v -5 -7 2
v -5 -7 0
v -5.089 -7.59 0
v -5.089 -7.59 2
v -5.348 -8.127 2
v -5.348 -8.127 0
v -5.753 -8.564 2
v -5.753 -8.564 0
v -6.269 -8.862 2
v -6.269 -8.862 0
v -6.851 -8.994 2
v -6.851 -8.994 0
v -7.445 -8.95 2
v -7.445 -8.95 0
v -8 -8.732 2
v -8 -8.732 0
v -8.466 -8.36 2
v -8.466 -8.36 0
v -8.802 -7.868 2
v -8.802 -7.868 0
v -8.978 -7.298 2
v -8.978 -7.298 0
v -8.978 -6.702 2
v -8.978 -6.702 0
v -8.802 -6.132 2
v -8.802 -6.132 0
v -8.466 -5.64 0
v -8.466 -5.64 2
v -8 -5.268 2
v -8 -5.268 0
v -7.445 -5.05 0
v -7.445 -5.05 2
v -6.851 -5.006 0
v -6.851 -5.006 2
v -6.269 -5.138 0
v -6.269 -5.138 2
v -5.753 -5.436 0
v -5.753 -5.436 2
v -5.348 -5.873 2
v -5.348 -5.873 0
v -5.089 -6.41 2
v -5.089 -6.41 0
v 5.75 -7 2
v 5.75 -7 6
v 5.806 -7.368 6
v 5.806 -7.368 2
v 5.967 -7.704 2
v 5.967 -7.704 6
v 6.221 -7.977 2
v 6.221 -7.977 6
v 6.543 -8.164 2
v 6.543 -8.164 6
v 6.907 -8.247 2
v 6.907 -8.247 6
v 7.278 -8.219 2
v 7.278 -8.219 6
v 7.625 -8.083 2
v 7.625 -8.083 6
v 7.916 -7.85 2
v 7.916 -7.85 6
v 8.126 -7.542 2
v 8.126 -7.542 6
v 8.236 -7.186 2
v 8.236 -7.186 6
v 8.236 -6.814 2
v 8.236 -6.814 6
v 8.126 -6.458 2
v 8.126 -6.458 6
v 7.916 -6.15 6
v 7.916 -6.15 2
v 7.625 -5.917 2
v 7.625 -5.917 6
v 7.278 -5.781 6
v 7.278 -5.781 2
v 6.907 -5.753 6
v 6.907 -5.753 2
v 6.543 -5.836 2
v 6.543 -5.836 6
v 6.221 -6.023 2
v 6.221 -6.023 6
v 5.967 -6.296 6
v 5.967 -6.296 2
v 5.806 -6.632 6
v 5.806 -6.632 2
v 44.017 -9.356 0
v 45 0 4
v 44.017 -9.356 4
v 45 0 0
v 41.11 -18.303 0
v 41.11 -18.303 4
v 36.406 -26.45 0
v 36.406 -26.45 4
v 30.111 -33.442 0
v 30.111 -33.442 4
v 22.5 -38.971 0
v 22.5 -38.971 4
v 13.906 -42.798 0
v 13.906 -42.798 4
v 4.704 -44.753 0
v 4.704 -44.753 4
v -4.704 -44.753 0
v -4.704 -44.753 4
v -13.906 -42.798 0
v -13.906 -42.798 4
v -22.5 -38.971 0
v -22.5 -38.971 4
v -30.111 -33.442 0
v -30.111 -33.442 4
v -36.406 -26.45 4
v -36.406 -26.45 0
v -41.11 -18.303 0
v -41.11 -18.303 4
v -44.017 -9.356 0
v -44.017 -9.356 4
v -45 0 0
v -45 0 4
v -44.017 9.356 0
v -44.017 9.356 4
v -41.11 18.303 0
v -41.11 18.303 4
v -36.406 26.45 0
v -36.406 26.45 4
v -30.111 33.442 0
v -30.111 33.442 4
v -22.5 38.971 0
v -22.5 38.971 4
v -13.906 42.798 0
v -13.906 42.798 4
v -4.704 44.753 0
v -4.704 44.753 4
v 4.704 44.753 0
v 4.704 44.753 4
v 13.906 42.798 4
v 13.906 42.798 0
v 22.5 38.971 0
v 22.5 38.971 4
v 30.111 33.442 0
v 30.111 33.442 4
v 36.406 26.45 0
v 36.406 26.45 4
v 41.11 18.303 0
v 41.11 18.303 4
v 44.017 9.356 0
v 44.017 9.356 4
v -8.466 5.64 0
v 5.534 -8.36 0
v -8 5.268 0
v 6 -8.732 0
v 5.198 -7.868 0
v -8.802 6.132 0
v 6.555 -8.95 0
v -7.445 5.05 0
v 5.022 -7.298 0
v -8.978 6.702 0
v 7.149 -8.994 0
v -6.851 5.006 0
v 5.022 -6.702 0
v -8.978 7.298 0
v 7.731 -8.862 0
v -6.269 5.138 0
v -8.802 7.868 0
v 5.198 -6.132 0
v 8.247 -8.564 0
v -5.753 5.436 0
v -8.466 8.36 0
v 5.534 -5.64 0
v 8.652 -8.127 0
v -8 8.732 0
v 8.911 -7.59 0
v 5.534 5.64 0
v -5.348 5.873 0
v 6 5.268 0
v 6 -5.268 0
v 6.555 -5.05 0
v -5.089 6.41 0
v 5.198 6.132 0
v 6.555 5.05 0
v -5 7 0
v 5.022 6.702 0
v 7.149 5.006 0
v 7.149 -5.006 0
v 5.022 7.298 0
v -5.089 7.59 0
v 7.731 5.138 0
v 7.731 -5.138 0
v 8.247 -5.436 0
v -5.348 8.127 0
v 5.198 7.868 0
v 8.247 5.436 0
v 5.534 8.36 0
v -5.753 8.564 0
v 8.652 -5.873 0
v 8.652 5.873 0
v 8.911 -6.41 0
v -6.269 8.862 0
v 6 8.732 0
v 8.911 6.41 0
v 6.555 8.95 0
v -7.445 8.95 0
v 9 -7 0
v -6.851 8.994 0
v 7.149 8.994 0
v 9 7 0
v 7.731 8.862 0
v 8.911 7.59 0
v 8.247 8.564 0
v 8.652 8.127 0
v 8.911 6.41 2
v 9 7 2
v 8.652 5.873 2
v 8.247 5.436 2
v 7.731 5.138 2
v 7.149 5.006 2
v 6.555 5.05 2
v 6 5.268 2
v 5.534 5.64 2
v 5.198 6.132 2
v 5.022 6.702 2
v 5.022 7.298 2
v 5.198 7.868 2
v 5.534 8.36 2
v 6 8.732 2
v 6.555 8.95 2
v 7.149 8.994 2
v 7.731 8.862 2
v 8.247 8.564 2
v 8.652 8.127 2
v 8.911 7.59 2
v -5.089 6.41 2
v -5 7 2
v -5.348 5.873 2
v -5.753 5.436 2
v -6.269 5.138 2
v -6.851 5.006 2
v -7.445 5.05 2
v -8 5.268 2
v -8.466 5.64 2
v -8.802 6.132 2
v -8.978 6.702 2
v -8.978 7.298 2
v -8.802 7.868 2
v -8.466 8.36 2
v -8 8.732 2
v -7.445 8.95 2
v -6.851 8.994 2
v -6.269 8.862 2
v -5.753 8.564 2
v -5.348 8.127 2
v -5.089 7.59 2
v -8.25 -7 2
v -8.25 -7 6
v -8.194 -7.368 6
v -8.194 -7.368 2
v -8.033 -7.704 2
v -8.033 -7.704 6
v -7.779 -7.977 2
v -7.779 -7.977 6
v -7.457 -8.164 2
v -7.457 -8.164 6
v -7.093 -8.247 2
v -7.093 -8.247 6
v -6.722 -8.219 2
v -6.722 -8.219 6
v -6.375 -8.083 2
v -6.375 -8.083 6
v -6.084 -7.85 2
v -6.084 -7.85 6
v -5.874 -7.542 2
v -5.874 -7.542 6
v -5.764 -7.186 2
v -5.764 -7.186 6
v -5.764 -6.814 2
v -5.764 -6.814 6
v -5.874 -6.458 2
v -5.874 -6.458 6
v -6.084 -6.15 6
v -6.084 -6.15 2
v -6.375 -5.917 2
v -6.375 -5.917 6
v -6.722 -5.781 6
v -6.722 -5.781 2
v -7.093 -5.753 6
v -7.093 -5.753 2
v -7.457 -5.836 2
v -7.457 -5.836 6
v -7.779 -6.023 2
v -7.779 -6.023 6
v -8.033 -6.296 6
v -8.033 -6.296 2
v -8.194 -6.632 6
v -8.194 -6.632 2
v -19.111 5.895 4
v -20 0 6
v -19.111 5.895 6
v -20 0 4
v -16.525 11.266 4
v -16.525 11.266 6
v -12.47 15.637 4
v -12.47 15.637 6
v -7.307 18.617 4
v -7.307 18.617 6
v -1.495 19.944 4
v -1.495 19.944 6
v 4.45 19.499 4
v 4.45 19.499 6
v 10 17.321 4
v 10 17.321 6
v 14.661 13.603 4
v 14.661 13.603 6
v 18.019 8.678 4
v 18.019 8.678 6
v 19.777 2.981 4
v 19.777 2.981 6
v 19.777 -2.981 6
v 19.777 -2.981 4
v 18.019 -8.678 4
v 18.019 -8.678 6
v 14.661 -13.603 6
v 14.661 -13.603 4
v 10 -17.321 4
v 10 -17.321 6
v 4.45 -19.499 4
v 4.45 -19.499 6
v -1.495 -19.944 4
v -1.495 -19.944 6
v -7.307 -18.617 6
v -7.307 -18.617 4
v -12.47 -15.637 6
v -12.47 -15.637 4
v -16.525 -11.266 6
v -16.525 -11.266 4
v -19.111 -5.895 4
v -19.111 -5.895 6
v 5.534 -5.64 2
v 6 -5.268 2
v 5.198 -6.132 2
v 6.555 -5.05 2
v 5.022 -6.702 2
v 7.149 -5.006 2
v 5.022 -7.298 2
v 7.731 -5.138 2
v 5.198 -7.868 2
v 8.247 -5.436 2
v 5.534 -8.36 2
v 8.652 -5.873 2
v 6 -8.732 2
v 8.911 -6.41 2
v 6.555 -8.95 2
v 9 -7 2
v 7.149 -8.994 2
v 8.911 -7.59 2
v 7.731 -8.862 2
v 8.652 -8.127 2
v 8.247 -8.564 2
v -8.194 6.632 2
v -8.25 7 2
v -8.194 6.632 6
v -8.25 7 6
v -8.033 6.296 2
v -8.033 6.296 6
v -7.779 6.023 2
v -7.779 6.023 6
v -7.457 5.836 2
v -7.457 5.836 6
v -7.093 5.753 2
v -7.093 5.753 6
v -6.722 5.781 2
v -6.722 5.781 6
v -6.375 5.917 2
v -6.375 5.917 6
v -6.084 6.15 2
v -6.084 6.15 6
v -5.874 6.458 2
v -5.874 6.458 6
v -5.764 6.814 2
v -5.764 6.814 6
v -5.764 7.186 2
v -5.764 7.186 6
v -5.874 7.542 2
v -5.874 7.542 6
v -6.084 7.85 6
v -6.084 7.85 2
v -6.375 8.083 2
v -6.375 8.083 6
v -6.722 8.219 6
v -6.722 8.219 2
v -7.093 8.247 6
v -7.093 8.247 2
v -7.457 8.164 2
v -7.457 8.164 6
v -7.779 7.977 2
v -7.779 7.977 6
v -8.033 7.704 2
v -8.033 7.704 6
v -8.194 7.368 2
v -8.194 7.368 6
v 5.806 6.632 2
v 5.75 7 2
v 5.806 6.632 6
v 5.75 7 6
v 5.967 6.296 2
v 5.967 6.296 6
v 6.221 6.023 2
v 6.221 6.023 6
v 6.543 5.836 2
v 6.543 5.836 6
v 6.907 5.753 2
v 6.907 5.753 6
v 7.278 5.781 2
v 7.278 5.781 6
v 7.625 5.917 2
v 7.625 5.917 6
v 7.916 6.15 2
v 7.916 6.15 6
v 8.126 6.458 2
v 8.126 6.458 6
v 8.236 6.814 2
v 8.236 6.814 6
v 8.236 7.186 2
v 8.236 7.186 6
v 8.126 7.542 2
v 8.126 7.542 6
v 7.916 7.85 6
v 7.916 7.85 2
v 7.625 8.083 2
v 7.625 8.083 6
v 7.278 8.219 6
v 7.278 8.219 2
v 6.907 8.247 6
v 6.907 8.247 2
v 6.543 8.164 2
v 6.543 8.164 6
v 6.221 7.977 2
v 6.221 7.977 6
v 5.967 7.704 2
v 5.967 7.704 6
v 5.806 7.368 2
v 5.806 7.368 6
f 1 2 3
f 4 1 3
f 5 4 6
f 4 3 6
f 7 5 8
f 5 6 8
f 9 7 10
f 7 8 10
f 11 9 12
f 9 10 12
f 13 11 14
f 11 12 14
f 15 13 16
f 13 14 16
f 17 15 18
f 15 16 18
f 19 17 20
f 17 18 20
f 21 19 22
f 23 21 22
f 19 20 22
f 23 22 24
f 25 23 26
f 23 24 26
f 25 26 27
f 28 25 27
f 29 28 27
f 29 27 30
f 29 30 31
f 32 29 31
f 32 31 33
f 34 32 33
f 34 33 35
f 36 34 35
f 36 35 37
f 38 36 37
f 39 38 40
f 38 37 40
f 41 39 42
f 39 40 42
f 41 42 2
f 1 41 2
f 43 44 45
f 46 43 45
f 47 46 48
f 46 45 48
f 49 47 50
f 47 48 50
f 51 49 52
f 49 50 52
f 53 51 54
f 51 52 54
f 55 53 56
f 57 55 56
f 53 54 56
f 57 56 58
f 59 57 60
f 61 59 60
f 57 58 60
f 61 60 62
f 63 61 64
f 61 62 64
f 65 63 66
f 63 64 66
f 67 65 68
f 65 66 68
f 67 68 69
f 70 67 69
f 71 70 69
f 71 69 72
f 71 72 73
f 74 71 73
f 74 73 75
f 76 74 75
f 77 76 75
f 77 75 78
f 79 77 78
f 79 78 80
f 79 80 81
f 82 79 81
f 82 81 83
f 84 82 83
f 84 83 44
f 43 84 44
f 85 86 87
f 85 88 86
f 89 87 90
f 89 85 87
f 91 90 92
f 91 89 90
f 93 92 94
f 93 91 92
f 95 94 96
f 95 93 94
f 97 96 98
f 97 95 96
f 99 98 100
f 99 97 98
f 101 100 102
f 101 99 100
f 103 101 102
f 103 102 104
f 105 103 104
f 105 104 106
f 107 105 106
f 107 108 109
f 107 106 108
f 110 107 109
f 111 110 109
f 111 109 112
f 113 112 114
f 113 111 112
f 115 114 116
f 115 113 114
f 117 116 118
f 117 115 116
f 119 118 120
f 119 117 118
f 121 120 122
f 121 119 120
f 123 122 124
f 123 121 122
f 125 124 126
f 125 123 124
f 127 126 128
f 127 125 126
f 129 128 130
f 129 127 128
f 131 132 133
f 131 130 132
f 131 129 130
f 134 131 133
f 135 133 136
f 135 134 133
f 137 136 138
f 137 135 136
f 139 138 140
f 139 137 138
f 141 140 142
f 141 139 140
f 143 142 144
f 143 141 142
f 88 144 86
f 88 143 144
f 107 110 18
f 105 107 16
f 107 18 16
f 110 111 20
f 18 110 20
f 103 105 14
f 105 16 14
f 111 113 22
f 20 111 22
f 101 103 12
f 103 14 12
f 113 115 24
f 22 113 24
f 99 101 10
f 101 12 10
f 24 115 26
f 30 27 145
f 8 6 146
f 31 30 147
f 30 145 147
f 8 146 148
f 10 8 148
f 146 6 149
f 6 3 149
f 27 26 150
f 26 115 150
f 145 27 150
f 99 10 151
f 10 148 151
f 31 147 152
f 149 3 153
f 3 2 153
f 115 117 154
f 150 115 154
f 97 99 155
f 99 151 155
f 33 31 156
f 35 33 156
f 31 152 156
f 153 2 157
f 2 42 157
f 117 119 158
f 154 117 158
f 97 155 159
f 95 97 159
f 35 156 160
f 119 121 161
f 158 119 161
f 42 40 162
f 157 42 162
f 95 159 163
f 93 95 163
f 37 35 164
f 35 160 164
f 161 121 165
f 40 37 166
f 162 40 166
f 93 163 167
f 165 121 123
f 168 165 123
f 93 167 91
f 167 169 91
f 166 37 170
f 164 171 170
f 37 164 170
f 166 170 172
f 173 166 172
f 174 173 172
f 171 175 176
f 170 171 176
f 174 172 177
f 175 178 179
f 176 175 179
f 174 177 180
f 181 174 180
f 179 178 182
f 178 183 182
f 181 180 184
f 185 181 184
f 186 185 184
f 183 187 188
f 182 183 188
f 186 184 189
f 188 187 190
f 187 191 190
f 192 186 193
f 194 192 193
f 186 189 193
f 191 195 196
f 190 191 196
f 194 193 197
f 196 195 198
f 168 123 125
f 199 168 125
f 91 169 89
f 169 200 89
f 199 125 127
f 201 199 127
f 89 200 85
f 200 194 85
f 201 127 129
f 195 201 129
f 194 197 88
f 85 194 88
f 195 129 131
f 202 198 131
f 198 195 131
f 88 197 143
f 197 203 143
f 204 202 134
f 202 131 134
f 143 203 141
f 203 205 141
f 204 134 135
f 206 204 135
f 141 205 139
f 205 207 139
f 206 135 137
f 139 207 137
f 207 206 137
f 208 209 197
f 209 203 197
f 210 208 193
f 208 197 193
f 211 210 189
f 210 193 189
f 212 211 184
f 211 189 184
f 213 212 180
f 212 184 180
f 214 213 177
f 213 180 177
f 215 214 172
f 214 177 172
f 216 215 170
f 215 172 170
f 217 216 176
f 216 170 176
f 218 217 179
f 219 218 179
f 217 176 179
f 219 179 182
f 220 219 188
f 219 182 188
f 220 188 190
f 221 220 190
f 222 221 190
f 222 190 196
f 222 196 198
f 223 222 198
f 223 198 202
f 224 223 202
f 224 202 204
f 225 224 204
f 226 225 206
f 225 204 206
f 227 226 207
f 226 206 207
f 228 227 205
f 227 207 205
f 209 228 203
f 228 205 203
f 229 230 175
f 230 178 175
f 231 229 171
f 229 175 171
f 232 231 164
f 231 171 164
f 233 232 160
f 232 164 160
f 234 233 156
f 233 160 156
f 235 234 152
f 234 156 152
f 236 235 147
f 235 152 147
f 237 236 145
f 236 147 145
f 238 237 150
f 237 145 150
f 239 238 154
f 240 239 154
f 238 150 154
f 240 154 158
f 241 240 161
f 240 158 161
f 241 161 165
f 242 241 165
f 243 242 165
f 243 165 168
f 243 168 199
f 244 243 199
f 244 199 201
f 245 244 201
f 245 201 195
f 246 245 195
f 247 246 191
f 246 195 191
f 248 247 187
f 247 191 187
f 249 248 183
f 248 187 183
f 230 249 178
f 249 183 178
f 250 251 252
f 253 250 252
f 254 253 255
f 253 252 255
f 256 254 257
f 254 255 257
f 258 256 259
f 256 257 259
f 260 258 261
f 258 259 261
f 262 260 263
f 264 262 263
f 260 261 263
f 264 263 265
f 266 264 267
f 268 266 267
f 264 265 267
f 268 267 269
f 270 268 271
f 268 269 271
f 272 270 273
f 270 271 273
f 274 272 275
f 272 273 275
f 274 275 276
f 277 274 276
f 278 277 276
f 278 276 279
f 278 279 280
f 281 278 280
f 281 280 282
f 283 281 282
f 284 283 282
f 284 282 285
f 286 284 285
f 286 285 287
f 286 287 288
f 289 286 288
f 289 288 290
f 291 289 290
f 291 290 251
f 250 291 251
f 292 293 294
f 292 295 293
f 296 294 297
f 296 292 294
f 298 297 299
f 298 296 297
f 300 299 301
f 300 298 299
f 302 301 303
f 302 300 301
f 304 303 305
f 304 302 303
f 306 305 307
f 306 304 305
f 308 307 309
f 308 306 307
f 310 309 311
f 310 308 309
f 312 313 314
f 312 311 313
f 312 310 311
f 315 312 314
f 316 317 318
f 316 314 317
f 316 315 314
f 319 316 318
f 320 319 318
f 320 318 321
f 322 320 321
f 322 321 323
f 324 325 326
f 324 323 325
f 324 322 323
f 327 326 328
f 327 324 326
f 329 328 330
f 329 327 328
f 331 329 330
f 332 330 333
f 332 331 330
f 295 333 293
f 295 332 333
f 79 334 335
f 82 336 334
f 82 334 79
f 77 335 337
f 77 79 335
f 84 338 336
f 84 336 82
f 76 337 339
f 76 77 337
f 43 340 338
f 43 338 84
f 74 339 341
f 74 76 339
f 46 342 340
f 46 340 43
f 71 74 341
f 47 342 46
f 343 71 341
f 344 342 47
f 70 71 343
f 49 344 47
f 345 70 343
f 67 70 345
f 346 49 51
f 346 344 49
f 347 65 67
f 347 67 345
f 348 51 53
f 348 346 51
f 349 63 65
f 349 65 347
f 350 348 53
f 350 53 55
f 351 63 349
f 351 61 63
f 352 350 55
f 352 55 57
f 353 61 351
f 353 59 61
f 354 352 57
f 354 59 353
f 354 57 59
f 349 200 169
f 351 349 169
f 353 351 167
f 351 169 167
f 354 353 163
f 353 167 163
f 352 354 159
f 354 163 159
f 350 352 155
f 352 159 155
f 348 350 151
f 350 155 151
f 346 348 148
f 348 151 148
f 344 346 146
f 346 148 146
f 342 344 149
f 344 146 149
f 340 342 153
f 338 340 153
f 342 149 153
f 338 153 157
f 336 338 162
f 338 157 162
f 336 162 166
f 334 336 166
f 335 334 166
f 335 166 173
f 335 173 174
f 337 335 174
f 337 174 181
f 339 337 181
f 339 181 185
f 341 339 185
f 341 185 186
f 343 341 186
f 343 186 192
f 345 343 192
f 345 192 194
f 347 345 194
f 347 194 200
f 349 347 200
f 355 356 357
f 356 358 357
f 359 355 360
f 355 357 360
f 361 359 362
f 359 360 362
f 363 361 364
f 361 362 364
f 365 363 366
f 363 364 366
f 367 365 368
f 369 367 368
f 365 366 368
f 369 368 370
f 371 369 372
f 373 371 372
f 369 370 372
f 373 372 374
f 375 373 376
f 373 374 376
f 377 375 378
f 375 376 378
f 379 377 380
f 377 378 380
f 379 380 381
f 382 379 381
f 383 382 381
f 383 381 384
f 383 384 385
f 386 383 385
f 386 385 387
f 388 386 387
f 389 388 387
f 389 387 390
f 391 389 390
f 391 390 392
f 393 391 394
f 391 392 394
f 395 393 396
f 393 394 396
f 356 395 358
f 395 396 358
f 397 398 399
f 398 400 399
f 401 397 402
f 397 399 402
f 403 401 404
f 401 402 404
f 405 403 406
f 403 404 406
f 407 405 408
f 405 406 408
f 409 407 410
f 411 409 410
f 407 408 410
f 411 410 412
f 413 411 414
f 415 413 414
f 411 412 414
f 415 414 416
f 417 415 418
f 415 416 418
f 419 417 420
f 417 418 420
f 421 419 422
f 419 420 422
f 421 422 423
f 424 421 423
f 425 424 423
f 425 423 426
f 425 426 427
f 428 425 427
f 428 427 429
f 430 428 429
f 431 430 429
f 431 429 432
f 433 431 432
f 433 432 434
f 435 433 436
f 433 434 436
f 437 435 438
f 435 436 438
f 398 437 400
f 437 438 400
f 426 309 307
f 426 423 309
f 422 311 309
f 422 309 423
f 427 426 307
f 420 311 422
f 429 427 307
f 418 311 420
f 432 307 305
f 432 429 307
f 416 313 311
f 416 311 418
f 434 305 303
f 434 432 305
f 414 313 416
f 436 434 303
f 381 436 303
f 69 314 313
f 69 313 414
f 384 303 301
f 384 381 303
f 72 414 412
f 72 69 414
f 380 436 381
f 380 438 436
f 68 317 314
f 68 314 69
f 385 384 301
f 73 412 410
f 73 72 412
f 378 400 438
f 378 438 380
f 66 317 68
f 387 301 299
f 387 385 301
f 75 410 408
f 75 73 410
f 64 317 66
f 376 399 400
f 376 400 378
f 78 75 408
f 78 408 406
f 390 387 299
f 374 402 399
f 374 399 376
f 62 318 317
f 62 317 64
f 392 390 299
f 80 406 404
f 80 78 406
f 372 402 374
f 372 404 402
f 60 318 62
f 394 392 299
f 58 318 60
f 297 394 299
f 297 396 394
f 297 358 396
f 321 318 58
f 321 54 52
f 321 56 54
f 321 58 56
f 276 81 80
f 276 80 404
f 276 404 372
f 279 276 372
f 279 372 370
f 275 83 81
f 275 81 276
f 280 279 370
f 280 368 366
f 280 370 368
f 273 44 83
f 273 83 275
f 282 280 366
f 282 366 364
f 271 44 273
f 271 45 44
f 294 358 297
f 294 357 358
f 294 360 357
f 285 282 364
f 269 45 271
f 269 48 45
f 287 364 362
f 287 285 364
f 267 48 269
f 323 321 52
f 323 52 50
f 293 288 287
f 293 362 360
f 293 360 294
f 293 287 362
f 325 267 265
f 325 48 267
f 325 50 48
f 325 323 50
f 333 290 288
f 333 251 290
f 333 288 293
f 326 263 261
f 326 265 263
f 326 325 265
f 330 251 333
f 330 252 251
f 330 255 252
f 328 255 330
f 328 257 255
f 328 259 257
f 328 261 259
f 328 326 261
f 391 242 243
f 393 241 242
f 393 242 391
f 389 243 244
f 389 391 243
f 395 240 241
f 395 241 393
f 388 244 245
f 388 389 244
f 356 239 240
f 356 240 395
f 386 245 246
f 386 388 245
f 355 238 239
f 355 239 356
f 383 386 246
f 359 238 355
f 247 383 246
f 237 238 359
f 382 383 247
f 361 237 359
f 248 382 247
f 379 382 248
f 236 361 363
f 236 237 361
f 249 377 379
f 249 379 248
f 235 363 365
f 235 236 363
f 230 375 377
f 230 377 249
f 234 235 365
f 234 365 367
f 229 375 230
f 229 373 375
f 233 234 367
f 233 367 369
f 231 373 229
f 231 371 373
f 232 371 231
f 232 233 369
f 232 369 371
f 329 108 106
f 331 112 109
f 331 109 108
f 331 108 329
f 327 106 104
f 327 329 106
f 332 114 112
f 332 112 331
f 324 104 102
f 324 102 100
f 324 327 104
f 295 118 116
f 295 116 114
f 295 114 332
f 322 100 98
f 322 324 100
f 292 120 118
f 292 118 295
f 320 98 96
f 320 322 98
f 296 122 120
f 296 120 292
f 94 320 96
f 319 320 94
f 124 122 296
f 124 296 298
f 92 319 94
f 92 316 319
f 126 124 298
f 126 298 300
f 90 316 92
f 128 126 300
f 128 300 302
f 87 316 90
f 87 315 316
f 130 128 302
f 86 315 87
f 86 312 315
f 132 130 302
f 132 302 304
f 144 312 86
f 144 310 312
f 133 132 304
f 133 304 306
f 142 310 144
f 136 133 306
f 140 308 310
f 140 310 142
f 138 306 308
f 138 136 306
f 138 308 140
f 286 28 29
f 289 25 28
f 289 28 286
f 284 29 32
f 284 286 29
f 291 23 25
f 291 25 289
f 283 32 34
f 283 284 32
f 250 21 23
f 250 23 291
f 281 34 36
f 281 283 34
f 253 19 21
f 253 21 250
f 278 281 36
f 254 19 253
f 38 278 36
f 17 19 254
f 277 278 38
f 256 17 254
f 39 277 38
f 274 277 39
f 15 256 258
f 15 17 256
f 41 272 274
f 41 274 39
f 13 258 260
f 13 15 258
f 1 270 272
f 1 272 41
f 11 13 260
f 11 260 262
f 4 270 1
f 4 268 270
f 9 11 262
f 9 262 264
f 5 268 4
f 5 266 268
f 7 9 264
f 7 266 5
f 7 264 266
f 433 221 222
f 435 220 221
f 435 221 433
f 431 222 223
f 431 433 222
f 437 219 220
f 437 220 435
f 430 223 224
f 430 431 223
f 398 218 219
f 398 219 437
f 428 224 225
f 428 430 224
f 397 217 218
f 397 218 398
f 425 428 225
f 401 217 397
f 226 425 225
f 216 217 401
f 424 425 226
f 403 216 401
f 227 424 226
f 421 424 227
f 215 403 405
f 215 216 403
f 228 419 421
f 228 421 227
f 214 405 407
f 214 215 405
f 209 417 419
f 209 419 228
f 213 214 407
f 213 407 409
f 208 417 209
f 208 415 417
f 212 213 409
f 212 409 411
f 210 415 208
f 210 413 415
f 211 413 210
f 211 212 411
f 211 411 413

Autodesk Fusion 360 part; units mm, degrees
sketch "Base" plane through (0, 0, 0) normal (0, 0, 1) x (1, 0, 0)
  circle A0 centre (0, 0) radius 45
  dimension "d1" = 90
extrude "Extrude1" add sketch "Base" along normal blind 4
sketch "Stand" plane through (0, 0, 4) normal (0, 0, 1) x (-1, 0, 0)
  circle A0 centre (0, 0) radius 45
  circle A1 centre (0, 0) radius 20
  dimension "d4" = 40
extrude "Extrude2" add sketch "Stand" along normal blind 2 contours A1
sketch "Holes" plane through (0, 0, 6) normal (0, 0, 1) x (-1, 0, 0)
  circle A0 centre (0, 0) radius 20
  circle A1 centre (7, -7) radius 1.25
  circle A2 centre (-7, -7) radius 1.25
  line L0 (20, 0) -> (20, -20)
  line L1 (20, -20) -> (0, -20)
  line L2 (-20, 0) -> (-20, 20)
  line L3 (-20, 20) -> (0, 20)
  line L4 (20, -20) -> (-20, -20)
  line L5 (-20, -20) -> (-20, 20)
  line L6 (-20, 20) -> (20, 20)
  line L7 (20, 20) -> (20, -20)
  circle A3 centre (7, 7) radius 1.25
  circle A4 centre (-7, 7) radius 1.25
  dimension "d7" = 2.5
  dimension "d8" = 2.5
  dimension "d10" = 13
  dimension "d11" = 13
  dimension "d12" = 13
  dimension "d13" = 13
  dimension "d14" = 2.5
  dimension "d15" = 2.5
  dimension "d16" = 13
  dimension "d17" = 13
  dimension "d18" = 13
  dimension "d19" = 13
extrude "Extrude3" cut sketch "Holes" against normal blind 6 contours A1 | A2 | A3 | A4
sketch "Fillets" plane through (0, 0, 0) normal (0, 0, -1) x (1, 0, 0)
  circle A0 centre (7, -7) radius 1.25
  circle A1 centre (-7, 7) radius 1.25
  circle A2 centre (-7, -7) radius 1.25
  circle A3 centre (7, 7) radius 1.25
  circle A4 centre (0, 0) radius 45
  circle A5 centre (-7, 7) radius 2
  circle A6 centre (7, 7) radius 2
  circle A7 centre (-7, -7) radius 2
  circle A8 centre (7, -7) radius 2
  dimension "d27" = 4
  dimension "d28" = 4
  dimension "d29" = 4
  dimension "d30" = 4
extrude "Extrude5" cut sketch "Fillets" against normal blind 2 contours A5 | A6 | A7 | A8
